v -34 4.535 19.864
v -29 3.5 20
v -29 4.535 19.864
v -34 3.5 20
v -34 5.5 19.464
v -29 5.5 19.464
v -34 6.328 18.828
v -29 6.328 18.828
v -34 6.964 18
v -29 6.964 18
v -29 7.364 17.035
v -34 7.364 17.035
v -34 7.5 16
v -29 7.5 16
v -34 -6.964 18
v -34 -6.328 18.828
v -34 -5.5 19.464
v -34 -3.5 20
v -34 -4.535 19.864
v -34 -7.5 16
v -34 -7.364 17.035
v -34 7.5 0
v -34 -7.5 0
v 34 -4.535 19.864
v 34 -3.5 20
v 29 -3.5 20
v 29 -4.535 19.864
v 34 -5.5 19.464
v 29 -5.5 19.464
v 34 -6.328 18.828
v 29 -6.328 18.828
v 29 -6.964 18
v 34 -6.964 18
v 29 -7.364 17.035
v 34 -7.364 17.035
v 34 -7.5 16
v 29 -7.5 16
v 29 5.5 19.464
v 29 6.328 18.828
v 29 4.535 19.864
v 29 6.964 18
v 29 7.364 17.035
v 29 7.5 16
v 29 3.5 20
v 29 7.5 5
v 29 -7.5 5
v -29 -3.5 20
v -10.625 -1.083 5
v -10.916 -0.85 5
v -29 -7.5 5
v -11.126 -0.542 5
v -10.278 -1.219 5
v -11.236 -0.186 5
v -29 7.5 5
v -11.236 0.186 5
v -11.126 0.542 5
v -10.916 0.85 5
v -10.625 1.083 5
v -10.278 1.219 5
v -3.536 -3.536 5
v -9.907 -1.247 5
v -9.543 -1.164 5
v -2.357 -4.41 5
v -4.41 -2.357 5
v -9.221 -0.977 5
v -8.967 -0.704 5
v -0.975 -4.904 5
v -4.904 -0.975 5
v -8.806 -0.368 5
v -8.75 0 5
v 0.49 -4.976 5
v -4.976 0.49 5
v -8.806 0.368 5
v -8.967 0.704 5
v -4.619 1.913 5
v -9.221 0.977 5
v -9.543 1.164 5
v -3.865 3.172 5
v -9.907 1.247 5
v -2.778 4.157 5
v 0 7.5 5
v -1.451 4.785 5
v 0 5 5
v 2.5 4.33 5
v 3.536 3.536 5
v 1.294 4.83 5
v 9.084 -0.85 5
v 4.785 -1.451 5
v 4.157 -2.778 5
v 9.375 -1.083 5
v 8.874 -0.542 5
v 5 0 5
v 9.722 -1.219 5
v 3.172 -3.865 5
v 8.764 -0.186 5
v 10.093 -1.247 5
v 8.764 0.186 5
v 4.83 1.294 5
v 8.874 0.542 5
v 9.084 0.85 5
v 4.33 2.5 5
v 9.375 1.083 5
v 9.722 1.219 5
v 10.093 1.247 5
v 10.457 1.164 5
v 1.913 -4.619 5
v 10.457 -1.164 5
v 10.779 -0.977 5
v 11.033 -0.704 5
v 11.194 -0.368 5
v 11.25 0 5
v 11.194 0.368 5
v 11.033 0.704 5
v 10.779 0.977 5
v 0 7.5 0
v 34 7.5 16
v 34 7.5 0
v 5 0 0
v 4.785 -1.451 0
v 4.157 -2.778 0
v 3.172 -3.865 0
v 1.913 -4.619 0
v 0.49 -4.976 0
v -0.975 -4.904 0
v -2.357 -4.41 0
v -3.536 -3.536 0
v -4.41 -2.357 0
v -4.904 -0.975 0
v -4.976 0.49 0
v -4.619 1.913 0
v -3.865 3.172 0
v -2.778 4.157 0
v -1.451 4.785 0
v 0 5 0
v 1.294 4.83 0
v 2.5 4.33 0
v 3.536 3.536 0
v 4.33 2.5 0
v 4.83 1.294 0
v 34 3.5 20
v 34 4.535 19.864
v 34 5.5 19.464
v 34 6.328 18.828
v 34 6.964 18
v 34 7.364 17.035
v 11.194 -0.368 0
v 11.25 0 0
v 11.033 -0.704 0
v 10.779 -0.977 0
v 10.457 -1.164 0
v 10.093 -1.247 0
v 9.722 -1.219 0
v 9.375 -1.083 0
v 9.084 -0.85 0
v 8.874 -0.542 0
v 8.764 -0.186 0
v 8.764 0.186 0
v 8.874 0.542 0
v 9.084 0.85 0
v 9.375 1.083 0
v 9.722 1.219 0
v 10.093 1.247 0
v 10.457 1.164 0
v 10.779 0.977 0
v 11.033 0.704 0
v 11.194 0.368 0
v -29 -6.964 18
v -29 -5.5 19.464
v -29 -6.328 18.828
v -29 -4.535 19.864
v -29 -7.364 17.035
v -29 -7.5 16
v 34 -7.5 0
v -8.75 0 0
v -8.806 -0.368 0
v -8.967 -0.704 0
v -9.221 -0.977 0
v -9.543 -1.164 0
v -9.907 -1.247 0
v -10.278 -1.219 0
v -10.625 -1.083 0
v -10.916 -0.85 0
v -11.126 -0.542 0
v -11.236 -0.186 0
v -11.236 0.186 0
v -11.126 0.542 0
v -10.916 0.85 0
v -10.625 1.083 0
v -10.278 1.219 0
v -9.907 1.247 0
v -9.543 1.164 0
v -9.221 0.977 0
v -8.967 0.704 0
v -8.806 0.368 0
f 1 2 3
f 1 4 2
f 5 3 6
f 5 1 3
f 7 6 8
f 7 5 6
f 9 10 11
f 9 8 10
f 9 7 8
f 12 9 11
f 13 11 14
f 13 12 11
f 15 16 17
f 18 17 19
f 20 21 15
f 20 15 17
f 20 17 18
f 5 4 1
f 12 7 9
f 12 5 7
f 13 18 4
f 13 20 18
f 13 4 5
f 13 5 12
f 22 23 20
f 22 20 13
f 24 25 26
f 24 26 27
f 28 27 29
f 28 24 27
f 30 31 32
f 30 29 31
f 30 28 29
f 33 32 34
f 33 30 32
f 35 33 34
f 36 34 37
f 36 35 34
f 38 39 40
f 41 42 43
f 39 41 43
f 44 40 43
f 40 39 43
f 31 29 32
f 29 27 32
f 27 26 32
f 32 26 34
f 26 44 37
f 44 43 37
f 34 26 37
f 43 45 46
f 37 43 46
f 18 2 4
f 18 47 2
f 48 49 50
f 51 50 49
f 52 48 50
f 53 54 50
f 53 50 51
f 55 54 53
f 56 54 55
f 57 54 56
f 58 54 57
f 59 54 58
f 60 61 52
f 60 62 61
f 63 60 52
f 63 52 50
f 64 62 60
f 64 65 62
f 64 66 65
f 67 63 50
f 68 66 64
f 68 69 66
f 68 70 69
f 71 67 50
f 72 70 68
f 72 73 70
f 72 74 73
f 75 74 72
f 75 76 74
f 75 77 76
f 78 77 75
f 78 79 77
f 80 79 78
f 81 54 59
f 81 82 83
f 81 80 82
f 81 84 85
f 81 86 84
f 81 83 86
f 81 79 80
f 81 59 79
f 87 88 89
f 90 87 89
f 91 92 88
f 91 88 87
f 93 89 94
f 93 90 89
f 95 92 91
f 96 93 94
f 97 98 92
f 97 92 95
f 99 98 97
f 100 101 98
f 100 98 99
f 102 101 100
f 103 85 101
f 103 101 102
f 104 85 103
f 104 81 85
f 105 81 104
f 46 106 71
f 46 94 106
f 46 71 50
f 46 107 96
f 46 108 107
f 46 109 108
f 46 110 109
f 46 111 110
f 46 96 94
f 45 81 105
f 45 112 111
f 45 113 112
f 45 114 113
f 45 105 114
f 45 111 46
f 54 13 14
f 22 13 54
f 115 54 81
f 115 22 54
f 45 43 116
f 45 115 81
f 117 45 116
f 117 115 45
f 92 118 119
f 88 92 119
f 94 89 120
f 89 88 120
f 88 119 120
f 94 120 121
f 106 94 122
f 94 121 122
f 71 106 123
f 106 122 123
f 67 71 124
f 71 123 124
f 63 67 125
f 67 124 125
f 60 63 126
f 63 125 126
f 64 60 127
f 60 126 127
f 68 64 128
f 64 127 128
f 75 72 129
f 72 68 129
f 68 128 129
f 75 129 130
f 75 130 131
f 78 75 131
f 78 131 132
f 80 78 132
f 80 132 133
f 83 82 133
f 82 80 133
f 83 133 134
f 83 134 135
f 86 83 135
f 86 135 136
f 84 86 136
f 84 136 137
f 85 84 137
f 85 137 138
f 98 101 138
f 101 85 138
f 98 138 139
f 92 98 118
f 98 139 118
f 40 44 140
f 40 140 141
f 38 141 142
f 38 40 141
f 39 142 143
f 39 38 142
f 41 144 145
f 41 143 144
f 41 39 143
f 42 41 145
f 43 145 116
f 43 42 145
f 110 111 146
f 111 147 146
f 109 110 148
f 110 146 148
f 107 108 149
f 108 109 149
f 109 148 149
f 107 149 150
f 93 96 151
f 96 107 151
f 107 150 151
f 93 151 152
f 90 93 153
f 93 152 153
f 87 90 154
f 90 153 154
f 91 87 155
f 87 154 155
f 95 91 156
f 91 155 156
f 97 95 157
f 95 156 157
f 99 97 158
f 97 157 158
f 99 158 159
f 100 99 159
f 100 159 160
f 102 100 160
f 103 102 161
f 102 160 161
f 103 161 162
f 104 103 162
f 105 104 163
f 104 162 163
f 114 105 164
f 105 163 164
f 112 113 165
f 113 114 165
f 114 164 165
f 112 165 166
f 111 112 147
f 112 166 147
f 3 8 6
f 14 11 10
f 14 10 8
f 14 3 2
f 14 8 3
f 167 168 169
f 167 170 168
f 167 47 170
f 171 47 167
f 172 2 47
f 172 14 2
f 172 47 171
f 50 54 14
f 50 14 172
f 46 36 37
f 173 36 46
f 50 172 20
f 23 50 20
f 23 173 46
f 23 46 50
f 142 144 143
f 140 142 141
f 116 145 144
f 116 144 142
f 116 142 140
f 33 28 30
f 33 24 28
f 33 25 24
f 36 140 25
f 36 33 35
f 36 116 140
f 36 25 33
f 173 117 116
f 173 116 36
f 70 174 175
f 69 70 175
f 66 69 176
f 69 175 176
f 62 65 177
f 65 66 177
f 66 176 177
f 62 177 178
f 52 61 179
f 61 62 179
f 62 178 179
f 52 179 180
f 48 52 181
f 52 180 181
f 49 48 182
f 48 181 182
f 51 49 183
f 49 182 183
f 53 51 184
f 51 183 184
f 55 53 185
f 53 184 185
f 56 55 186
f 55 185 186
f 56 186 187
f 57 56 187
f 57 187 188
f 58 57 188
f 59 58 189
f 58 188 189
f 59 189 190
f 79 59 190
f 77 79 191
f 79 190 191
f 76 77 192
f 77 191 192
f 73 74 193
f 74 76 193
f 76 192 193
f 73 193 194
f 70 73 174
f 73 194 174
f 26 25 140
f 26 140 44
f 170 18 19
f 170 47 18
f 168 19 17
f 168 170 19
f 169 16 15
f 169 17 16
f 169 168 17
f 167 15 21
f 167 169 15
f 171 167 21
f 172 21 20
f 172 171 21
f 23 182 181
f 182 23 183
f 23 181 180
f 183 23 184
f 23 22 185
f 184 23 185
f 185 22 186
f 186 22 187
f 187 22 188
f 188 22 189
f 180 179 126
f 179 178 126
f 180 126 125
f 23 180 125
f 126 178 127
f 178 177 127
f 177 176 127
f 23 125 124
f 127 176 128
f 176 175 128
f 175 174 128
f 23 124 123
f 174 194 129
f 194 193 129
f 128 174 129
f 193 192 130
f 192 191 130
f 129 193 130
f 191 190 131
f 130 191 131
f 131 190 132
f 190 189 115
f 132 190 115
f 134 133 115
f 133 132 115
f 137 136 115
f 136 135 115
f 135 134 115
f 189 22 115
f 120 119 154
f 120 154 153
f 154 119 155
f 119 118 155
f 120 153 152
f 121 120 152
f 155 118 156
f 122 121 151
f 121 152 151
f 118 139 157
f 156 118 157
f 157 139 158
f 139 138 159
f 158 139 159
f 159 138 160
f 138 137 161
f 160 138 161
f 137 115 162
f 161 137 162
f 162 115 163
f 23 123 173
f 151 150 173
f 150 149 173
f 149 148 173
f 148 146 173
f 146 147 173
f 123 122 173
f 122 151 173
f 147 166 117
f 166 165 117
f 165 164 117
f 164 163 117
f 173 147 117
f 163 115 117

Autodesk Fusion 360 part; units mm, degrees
sketch "Sketch1" plane through (0, 0, 0) normal (0, 0, 1) x (1, 0, 0)
  line L0 (34, -7.5) -> (-34, -7.5)
  line L1 (-34, -7.5) -> (-34, 7.5)
  line L2 (-34, 7.5) -> (34, 7.5)
  line L3 (34, 7.5) -> (34, -7.5)
  line L4 (34, -7.5) -> (-34, 7.5) construction
  line L5 (-34, -7.5) -> (34, 7.5) construction
  circle A0 centre (0, 0) radius 5
  line L6 (0, 0) -> (10, 0) construction
  circle A1 centre (10, 0) radius 1.25
  line L7 (0, 2.5) -> (0, 20)
  circle A2 centre (-10, 0) radius 1.25
  dimension "d18" = 68
  dimension "d19" = 15
  dimension "d20" = 10
  dimension "d22" = 10
  dimension "d23" = 2.5
extrude "Extrude1" add sketch "Sketch1" along normal blind 5
sketch "Sketch2" plane through (0, 0, 5) normal (0, 0, 1) x (-1, 0, 0)
  line L0 (0, -2.5) -> (0, -20)
  circle A0 centre (-10, 0) radius 1.25
  circle A1 centre (10, 0) radius 1.25
  circle A2 centre (0, 0) radius 5
  line L1 (-34, -7.5) -> (34, -7.5)
  line L2 (34, -7.5) -> (34, 7.5)
  line L3 (34, 7.5) -> (-34, 7.5)
  line L4 (-34, 7.5) -> (-34, -7.5)
  line L5 (34, -7.5) -> (29, -7.5)
  line L6 (29, -7.5) -> (29, 7.5)
  line L7 (29, 7.5) -> (34, 7.5)
  line L8 (34, 7.5) -> (34, -7.5)
  line L9 (-34, -7.5) -> (-29, -7.5)
  line L10 (-29, -7.5) -> (-29, 7.5)
  line L11 (-29, 7.5) -> (-34, 7.5)
  line L12 (-34, 7.5) -> (-34, -7.5)
  dimension "d24" = 5
  dimension "d25" = 5
extrude "Extrude2" add sketch "Sketch2" along normal blind 15 contours L1 L3 L4 L9 L10 L11 L12 | L1 L2 L3 L5 L6 L7 L8
fillet "Fillet2" radius 4 4 edges at (-31.5, -7.5, 20) (-31.5, 7.5, 20) (31.5, -7.5, 20) (31.5, 7.5, 20)
